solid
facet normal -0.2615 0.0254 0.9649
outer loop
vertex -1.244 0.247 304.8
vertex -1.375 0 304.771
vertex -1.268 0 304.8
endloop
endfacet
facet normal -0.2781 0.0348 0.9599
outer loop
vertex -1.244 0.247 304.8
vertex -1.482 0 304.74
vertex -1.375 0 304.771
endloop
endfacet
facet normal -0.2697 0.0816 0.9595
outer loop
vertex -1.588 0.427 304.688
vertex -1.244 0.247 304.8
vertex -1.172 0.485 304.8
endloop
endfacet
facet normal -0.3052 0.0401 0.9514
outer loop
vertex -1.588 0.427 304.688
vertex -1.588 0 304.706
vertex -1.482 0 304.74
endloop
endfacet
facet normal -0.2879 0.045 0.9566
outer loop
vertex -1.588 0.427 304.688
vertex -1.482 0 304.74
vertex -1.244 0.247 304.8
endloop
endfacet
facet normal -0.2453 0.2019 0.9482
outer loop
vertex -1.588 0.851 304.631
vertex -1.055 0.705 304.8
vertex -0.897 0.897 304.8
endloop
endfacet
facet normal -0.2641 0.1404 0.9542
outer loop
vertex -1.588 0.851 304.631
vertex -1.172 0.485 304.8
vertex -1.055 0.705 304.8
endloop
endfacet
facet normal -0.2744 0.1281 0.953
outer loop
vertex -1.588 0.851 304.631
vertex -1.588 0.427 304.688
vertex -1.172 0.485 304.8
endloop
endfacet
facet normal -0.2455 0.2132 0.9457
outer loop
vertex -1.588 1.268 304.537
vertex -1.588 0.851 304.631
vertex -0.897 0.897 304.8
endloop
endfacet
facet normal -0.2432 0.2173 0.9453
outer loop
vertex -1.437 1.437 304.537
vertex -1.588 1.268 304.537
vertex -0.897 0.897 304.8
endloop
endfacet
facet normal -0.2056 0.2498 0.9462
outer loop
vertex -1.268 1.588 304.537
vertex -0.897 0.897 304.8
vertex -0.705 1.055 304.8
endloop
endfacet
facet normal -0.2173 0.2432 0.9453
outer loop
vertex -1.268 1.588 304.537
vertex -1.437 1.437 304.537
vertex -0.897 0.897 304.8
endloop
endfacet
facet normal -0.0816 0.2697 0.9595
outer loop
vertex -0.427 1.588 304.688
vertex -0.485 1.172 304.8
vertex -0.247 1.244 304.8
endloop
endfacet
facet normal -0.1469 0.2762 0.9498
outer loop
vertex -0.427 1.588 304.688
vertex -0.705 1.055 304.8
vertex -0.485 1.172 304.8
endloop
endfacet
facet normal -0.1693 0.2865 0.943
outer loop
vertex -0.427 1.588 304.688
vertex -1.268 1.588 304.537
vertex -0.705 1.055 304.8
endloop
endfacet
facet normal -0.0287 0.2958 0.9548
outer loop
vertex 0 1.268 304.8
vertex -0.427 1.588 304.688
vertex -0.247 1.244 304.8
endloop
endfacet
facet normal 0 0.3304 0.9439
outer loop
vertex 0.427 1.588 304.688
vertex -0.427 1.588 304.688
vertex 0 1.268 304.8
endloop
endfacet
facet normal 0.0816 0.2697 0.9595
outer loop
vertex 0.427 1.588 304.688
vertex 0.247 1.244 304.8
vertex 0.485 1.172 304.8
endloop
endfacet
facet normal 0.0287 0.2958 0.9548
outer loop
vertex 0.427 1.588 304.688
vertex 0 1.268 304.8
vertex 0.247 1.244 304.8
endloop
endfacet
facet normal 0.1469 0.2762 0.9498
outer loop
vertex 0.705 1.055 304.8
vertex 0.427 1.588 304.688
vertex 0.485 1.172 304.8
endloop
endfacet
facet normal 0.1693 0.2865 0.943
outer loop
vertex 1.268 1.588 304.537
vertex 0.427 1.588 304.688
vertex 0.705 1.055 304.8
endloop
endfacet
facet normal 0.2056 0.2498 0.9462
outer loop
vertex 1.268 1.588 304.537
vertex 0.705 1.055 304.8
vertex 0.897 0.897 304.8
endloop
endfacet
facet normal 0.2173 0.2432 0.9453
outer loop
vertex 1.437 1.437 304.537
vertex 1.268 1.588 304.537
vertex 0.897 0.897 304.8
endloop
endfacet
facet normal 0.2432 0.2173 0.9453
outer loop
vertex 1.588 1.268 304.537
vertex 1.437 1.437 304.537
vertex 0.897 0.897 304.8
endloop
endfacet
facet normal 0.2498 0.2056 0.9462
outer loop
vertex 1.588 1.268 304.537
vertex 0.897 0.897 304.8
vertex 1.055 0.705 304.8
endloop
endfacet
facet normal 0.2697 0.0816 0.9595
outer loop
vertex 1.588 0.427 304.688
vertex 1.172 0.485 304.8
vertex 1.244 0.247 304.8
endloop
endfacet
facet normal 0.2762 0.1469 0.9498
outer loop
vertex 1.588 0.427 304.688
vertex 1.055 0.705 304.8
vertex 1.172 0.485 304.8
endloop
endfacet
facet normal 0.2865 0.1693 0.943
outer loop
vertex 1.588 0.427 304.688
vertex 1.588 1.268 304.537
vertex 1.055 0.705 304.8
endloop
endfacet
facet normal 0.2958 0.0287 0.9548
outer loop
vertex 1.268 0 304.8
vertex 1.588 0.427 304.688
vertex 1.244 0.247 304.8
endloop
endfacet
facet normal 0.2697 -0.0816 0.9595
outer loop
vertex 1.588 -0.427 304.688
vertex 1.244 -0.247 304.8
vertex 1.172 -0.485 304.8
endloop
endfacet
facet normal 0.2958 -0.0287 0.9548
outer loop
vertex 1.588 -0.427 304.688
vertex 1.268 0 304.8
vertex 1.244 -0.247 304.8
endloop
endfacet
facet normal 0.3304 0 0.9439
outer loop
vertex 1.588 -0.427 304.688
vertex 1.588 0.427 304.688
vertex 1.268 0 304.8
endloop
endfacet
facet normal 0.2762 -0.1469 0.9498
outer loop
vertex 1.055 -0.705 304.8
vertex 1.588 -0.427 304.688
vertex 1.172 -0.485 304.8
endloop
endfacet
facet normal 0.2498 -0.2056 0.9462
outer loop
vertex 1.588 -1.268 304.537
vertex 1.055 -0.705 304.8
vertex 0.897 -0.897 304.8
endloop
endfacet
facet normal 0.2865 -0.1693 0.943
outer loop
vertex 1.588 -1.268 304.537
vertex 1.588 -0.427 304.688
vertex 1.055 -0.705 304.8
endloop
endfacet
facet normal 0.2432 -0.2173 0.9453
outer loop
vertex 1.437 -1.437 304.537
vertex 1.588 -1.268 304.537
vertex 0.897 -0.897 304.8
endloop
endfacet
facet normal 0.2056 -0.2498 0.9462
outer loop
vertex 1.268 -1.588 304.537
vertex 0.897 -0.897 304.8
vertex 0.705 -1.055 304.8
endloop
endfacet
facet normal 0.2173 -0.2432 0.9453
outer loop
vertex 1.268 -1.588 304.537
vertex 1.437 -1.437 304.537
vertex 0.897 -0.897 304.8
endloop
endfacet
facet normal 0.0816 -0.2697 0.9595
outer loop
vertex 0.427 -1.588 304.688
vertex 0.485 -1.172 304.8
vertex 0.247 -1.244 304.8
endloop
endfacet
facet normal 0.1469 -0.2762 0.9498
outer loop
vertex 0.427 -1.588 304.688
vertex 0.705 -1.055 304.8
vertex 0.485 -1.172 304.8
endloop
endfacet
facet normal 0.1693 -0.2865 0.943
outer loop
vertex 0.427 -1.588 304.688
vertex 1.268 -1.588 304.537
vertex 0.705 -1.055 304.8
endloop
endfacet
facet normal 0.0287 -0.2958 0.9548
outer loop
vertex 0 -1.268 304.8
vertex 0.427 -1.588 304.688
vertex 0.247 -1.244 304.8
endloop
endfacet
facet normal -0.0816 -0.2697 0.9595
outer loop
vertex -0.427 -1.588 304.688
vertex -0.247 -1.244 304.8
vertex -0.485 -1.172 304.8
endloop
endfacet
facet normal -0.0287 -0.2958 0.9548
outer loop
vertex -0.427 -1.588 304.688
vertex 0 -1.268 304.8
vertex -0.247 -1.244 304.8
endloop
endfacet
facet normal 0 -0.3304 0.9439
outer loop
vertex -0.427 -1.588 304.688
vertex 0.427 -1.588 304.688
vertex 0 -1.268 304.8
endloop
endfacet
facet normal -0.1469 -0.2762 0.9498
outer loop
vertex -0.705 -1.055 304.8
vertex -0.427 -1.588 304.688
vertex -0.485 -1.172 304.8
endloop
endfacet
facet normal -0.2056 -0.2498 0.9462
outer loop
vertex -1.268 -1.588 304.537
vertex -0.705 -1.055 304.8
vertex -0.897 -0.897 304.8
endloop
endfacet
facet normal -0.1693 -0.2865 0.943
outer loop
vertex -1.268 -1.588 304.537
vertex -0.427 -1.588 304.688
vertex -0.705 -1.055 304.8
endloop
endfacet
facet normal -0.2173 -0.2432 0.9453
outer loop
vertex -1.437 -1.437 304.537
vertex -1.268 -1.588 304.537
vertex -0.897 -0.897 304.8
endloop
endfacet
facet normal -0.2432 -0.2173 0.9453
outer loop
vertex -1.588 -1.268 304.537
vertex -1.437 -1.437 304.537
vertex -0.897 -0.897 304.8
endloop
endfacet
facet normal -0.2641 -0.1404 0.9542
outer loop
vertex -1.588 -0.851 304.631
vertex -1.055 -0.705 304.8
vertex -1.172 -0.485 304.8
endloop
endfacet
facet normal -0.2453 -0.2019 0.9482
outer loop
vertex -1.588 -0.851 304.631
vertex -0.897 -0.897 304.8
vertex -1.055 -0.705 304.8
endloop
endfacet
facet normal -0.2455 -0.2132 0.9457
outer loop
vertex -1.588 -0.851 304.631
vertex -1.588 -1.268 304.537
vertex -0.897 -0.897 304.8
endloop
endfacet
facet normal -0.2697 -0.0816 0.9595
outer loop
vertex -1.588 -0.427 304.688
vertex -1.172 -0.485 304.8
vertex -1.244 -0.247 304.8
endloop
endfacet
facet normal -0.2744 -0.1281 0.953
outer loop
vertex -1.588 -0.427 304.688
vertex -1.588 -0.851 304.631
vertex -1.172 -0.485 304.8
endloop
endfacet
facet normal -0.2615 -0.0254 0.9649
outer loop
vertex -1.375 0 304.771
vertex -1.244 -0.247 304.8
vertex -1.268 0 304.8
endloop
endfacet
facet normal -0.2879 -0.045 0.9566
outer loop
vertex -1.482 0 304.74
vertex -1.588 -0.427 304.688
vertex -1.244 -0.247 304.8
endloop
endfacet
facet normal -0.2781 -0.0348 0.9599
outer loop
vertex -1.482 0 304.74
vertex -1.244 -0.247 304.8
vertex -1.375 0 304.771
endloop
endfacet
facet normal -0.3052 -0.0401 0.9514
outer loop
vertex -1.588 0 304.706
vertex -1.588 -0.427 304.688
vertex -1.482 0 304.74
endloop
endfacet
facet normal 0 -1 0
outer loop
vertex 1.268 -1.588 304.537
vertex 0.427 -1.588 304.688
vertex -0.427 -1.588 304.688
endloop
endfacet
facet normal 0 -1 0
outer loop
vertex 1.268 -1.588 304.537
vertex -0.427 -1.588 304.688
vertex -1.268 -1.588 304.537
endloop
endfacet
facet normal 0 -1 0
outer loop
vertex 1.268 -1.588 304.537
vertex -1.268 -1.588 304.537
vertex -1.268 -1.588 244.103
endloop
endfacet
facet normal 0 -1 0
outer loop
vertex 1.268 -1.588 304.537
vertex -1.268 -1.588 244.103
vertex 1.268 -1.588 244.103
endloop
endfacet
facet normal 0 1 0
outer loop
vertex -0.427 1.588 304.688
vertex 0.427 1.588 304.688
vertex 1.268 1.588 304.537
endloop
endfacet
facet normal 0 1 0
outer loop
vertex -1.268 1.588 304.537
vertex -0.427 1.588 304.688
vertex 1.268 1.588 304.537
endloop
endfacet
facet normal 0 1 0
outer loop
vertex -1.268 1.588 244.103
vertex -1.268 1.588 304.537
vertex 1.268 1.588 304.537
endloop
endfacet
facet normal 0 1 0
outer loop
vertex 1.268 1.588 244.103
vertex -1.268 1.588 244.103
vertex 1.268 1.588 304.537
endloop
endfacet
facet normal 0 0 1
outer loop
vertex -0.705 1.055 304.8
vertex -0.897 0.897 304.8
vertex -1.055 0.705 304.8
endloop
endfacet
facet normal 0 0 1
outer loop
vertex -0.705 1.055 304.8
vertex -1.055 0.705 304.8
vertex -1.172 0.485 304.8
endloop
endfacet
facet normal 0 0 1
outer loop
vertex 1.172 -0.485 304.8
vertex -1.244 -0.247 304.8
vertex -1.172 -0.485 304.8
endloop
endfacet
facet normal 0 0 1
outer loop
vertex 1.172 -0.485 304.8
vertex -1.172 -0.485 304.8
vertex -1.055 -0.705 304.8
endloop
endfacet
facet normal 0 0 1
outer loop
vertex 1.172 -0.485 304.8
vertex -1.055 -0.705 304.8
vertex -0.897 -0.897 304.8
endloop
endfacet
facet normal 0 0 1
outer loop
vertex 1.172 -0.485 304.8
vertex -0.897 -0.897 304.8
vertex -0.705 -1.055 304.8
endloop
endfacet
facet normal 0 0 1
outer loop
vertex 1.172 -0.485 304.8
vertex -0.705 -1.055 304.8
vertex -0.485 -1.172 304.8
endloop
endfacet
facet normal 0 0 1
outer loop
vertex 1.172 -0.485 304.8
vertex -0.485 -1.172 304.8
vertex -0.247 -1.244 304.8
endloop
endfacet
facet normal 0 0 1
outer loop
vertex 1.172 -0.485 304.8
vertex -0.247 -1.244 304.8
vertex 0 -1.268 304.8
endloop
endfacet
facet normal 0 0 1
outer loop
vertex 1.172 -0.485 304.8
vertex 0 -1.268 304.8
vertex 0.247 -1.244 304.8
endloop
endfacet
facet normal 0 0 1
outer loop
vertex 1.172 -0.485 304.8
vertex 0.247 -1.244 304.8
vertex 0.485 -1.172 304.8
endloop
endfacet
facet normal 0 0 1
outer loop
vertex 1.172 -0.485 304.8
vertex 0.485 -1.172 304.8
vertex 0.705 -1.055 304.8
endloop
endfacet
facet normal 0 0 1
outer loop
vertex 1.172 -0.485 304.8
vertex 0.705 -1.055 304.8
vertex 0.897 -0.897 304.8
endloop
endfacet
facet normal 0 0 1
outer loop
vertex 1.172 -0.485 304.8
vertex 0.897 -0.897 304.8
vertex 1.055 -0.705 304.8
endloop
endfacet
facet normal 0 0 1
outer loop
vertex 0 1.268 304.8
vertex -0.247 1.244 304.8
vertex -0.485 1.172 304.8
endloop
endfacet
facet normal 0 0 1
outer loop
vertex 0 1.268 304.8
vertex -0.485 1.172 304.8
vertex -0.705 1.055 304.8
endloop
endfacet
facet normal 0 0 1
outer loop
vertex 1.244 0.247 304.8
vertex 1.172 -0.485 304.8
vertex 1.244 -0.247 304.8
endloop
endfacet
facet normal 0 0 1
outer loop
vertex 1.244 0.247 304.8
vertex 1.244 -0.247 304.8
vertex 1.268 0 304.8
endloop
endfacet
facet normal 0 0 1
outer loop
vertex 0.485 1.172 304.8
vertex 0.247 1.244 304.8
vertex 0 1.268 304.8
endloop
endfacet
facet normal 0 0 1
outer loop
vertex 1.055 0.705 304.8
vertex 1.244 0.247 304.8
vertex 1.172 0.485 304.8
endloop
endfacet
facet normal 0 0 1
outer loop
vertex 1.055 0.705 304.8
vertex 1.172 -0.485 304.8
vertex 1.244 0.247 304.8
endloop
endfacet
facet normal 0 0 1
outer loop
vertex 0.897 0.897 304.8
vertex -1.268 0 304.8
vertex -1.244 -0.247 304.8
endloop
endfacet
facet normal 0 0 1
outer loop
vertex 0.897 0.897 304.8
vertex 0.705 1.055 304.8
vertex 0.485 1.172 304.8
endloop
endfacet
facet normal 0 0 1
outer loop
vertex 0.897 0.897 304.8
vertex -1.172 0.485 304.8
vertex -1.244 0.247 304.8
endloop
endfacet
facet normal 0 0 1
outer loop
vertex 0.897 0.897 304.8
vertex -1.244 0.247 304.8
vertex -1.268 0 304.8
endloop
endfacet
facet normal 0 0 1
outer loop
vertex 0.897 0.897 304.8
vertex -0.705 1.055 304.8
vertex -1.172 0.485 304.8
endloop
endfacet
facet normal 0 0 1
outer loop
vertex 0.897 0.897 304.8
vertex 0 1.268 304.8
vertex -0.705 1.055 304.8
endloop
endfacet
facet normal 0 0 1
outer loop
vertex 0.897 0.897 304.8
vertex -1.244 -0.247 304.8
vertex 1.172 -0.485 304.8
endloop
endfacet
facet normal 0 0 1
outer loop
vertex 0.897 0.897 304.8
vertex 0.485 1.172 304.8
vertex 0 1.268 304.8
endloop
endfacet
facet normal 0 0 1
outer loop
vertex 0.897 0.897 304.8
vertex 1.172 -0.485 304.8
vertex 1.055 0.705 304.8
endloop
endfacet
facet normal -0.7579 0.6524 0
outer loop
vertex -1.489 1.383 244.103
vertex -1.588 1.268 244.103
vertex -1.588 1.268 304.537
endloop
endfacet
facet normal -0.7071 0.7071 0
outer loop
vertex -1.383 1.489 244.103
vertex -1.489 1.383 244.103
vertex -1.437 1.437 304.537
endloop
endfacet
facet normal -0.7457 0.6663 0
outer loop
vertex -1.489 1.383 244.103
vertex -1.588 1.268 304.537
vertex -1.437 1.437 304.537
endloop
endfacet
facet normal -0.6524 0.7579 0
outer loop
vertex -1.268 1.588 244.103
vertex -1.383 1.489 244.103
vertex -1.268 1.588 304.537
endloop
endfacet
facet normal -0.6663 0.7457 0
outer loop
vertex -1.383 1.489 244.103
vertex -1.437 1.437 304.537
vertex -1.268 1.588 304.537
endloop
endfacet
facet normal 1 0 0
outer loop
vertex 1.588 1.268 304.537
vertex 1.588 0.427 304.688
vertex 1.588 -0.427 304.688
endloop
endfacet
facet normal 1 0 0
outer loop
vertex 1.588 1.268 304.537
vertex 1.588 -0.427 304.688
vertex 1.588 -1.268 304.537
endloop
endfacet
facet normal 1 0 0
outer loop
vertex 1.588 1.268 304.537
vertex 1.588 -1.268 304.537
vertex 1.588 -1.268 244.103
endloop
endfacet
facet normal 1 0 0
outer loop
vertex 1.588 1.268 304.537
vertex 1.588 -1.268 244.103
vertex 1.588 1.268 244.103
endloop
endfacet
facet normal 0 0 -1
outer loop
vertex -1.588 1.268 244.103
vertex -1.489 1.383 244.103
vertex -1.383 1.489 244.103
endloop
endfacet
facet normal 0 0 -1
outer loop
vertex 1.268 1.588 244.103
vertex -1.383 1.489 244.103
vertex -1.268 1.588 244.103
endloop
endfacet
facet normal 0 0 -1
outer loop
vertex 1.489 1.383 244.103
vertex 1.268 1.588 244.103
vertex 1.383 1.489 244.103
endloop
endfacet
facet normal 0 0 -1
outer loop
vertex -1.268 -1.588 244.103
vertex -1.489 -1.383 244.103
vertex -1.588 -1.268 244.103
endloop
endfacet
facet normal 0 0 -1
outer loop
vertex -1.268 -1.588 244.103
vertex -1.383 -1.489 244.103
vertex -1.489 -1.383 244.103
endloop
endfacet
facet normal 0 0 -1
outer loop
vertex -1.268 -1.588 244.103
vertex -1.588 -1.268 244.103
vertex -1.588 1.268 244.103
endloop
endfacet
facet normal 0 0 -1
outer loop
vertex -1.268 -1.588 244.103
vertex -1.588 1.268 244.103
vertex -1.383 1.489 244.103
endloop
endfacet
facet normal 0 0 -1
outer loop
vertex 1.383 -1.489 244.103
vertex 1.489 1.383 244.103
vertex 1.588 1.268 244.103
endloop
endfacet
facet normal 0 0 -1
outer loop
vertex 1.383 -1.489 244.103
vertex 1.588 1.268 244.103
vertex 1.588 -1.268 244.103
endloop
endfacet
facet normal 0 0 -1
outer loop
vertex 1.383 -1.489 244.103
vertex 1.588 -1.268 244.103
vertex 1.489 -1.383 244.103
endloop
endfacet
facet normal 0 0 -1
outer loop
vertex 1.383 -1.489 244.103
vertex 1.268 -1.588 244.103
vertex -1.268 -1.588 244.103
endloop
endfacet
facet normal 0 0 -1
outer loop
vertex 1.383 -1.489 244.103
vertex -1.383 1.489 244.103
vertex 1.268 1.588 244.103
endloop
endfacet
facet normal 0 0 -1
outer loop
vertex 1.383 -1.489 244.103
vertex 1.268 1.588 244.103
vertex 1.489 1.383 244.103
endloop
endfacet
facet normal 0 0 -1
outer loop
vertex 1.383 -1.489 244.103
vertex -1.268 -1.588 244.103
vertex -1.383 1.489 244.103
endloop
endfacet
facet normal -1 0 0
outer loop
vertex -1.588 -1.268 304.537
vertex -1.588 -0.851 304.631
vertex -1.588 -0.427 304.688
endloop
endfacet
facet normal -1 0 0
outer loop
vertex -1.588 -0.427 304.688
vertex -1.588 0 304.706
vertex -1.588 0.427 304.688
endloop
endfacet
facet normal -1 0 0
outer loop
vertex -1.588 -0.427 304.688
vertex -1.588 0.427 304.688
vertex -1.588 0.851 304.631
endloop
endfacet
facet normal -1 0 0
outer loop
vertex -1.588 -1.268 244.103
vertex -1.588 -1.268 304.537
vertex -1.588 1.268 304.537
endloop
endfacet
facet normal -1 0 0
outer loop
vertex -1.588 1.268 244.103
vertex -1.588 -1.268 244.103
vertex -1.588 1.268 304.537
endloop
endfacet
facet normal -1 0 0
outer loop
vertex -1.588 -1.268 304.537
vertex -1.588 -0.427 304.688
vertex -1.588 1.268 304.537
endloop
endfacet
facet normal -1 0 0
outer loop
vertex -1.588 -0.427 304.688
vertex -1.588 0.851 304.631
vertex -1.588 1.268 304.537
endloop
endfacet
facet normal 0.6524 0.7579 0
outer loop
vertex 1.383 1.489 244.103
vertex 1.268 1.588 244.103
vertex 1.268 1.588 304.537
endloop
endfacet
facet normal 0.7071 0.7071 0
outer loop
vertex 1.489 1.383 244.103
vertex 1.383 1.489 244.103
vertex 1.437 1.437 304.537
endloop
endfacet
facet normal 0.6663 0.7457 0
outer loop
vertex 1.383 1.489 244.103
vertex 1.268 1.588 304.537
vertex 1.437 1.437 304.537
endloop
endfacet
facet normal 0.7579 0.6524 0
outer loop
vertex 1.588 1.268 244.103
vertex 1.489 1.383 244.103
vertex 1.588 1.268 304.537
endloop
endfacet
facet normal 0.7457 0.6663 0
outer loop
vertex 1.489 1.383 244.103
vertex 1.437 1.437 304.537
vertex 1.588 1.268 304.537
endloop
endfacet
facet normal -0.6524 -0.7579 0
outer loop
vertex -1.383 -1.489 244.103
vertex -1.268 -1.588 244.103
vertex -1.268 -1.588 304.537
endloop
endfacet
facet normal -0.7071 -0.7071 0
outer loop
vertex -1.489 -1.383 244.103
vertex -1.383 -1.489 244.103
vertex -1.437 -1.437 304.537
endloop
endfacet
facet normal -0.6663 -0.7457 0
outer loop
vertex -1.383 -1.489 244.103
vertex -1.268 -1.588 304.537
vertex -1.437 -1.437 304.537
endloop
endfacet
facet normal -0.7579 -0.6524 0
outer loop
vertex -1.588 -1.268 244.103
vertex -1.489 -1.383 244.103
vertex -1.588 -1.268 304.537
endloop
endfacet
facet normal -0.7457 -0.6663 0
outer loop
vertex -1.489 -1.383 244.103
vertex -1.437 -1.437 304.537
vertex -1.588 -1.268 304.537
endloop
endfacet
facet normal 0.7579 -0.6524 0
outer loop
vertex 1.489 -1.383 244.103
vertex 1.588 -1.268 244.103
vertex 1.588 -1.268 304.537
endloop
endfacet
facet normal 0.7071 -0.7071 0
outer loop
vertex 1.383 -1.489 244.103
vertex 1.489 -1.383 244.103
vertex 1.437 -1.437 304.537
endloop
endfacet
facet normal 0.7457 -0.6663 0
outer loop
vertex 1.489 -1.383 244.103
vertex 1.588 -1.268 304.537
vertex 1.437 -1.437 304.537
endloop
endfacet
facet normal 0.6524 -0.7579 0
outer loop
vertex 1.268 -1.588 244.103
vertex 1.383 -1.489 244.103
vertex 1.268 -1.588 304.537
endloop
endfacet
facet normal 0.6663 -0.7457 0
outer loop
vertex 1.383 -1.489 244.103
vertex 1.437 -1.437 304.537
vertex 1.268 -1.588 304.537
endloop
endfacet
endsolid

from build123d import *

# Parameters (mm, degrees)
SKETCH1_W           = 3.175
SKETCH1_H           = 3.175
BOSS_EXTRUDE1_DEPTH = 152.4
SKETCH2_OUTSIDE_W   = 35.668
SKETCH2_OUTSIDE_H   = 35.668
SKETCH2_OUTSIDE_R   = 2.032
CUT_EXTRUDE1_DEPTH  = 153.4
CUT_EXTRUDE2_DEPTH  = 4.175
SKETCH6_W           = 3.175
SKETCH6_H           = 12.7
CUT_EXTRUDE3_DEPTH  = 4.175
SKETCH7_W           = 3.175
SKETCH7_H           = 27.94
CUT_EXTRUDE4_DEPTH  = 4.175


with BuildPart() as part:
    # Sketch1 → Boss-Extrude1 (new body)
    with BuildSketch(Plane.XY):
        Rectangle(SKETCH1_W, SKETCH1_H)
    extrude(amount=BOSS_EXTRUDE1_DEPTH)

    # Sketch2 outside → Cut-Extrude1 (cut, through all)
    with BuildSketch(Plane(origin=(0, 0, 0), x_dir=(-1, 0, 0), z_dir=(0, 0, -1))):
        Rectangle(SKETCH2_OUTSIDE_W, SKETCH2_OUTSIDE_H)
        Circle(SKETCH2_OUTSIDE_R, mode=Mode.SUBTRACT)
    extrude(amount=-CUT_EXTRUDE1_DEPTH, mode=Mode.SUBTRACT)

    # Sketch3 → Cut-Revolve1 (revolve, cut)
    with BuildSketch(Plane(origin=(0, 0, 0), x_dir=(1, 0, 0), z_dir=(0, 1, 0))):
        with BuildLine():
            Line((-5.053685963, -4.40273269), (-5.053685963, 5.740530545))
            Line((-5.053685963, 5.740530545), (0, 5.740530545))
            Line((0, 5.740530545), (0, 0.160877736))
            ThreePointArc((0, 0.160877736), (-3.404639553, -1.148866368), (-5.053685963, -4.40273269))
        make_face()
    revolve(axis=Axis((0, 0, 152.4), (0, 0, -1)), mode=Mode.SUBTRACT)

    # Mirror1: part across plane


with BuildPart() as part_1:
    add(part.part)
    add(part.part.mirror(Plane(origin=(0, 0, 152.4), x_dir=(1, 0, 0), z_dir=(0, 0, -1))))

    # Sketch4 → Cut-Extrude2 (cut, through all)
    with BuildSketch(Plane(origin=(1.5875, 0, 0), x_dir=(0, 0, -1), z_dir=(1, 0, 0))):
        Polygon((-0.263225358, -1.5875), (-203.463225358, -1.5875), (-203.463225358, 1.5875), (-0.263225358, 1.5875), (0.835678169, 1.5875), (0.835678169, -1.5875), align=None)
    extrude(amount=-CUT_EXTRUDE2_DEPTH, mode=Mode.SUBTRACT)

    # Sketch6 → Cut-Extrude3 (cut, through all)
    with BuildSketch(Plane.XZ.offset(1.5875)):
        with Locations((0, 209.813225358)):
            Rectangle(SKETCH6_W, SKETCH6_H)
    extrude(amount=-CUT_EXTRUDE3_DEPTH, mode=Mode.SUBTRACT)

    # Sketch7 → Cut-Extrude4 (cut, through all)
    with BuildSketch(Plane.XZ.offset(1.5875)):
        with Locations((0, 230.133225358)):
            Rectangle(SKETCH7_W, SKETCH7_H)
    extrude(amount=-CUT_EXTRUDE4_DEPTH, mode=Mode.SUBTRACT)


solid = part_1.part
